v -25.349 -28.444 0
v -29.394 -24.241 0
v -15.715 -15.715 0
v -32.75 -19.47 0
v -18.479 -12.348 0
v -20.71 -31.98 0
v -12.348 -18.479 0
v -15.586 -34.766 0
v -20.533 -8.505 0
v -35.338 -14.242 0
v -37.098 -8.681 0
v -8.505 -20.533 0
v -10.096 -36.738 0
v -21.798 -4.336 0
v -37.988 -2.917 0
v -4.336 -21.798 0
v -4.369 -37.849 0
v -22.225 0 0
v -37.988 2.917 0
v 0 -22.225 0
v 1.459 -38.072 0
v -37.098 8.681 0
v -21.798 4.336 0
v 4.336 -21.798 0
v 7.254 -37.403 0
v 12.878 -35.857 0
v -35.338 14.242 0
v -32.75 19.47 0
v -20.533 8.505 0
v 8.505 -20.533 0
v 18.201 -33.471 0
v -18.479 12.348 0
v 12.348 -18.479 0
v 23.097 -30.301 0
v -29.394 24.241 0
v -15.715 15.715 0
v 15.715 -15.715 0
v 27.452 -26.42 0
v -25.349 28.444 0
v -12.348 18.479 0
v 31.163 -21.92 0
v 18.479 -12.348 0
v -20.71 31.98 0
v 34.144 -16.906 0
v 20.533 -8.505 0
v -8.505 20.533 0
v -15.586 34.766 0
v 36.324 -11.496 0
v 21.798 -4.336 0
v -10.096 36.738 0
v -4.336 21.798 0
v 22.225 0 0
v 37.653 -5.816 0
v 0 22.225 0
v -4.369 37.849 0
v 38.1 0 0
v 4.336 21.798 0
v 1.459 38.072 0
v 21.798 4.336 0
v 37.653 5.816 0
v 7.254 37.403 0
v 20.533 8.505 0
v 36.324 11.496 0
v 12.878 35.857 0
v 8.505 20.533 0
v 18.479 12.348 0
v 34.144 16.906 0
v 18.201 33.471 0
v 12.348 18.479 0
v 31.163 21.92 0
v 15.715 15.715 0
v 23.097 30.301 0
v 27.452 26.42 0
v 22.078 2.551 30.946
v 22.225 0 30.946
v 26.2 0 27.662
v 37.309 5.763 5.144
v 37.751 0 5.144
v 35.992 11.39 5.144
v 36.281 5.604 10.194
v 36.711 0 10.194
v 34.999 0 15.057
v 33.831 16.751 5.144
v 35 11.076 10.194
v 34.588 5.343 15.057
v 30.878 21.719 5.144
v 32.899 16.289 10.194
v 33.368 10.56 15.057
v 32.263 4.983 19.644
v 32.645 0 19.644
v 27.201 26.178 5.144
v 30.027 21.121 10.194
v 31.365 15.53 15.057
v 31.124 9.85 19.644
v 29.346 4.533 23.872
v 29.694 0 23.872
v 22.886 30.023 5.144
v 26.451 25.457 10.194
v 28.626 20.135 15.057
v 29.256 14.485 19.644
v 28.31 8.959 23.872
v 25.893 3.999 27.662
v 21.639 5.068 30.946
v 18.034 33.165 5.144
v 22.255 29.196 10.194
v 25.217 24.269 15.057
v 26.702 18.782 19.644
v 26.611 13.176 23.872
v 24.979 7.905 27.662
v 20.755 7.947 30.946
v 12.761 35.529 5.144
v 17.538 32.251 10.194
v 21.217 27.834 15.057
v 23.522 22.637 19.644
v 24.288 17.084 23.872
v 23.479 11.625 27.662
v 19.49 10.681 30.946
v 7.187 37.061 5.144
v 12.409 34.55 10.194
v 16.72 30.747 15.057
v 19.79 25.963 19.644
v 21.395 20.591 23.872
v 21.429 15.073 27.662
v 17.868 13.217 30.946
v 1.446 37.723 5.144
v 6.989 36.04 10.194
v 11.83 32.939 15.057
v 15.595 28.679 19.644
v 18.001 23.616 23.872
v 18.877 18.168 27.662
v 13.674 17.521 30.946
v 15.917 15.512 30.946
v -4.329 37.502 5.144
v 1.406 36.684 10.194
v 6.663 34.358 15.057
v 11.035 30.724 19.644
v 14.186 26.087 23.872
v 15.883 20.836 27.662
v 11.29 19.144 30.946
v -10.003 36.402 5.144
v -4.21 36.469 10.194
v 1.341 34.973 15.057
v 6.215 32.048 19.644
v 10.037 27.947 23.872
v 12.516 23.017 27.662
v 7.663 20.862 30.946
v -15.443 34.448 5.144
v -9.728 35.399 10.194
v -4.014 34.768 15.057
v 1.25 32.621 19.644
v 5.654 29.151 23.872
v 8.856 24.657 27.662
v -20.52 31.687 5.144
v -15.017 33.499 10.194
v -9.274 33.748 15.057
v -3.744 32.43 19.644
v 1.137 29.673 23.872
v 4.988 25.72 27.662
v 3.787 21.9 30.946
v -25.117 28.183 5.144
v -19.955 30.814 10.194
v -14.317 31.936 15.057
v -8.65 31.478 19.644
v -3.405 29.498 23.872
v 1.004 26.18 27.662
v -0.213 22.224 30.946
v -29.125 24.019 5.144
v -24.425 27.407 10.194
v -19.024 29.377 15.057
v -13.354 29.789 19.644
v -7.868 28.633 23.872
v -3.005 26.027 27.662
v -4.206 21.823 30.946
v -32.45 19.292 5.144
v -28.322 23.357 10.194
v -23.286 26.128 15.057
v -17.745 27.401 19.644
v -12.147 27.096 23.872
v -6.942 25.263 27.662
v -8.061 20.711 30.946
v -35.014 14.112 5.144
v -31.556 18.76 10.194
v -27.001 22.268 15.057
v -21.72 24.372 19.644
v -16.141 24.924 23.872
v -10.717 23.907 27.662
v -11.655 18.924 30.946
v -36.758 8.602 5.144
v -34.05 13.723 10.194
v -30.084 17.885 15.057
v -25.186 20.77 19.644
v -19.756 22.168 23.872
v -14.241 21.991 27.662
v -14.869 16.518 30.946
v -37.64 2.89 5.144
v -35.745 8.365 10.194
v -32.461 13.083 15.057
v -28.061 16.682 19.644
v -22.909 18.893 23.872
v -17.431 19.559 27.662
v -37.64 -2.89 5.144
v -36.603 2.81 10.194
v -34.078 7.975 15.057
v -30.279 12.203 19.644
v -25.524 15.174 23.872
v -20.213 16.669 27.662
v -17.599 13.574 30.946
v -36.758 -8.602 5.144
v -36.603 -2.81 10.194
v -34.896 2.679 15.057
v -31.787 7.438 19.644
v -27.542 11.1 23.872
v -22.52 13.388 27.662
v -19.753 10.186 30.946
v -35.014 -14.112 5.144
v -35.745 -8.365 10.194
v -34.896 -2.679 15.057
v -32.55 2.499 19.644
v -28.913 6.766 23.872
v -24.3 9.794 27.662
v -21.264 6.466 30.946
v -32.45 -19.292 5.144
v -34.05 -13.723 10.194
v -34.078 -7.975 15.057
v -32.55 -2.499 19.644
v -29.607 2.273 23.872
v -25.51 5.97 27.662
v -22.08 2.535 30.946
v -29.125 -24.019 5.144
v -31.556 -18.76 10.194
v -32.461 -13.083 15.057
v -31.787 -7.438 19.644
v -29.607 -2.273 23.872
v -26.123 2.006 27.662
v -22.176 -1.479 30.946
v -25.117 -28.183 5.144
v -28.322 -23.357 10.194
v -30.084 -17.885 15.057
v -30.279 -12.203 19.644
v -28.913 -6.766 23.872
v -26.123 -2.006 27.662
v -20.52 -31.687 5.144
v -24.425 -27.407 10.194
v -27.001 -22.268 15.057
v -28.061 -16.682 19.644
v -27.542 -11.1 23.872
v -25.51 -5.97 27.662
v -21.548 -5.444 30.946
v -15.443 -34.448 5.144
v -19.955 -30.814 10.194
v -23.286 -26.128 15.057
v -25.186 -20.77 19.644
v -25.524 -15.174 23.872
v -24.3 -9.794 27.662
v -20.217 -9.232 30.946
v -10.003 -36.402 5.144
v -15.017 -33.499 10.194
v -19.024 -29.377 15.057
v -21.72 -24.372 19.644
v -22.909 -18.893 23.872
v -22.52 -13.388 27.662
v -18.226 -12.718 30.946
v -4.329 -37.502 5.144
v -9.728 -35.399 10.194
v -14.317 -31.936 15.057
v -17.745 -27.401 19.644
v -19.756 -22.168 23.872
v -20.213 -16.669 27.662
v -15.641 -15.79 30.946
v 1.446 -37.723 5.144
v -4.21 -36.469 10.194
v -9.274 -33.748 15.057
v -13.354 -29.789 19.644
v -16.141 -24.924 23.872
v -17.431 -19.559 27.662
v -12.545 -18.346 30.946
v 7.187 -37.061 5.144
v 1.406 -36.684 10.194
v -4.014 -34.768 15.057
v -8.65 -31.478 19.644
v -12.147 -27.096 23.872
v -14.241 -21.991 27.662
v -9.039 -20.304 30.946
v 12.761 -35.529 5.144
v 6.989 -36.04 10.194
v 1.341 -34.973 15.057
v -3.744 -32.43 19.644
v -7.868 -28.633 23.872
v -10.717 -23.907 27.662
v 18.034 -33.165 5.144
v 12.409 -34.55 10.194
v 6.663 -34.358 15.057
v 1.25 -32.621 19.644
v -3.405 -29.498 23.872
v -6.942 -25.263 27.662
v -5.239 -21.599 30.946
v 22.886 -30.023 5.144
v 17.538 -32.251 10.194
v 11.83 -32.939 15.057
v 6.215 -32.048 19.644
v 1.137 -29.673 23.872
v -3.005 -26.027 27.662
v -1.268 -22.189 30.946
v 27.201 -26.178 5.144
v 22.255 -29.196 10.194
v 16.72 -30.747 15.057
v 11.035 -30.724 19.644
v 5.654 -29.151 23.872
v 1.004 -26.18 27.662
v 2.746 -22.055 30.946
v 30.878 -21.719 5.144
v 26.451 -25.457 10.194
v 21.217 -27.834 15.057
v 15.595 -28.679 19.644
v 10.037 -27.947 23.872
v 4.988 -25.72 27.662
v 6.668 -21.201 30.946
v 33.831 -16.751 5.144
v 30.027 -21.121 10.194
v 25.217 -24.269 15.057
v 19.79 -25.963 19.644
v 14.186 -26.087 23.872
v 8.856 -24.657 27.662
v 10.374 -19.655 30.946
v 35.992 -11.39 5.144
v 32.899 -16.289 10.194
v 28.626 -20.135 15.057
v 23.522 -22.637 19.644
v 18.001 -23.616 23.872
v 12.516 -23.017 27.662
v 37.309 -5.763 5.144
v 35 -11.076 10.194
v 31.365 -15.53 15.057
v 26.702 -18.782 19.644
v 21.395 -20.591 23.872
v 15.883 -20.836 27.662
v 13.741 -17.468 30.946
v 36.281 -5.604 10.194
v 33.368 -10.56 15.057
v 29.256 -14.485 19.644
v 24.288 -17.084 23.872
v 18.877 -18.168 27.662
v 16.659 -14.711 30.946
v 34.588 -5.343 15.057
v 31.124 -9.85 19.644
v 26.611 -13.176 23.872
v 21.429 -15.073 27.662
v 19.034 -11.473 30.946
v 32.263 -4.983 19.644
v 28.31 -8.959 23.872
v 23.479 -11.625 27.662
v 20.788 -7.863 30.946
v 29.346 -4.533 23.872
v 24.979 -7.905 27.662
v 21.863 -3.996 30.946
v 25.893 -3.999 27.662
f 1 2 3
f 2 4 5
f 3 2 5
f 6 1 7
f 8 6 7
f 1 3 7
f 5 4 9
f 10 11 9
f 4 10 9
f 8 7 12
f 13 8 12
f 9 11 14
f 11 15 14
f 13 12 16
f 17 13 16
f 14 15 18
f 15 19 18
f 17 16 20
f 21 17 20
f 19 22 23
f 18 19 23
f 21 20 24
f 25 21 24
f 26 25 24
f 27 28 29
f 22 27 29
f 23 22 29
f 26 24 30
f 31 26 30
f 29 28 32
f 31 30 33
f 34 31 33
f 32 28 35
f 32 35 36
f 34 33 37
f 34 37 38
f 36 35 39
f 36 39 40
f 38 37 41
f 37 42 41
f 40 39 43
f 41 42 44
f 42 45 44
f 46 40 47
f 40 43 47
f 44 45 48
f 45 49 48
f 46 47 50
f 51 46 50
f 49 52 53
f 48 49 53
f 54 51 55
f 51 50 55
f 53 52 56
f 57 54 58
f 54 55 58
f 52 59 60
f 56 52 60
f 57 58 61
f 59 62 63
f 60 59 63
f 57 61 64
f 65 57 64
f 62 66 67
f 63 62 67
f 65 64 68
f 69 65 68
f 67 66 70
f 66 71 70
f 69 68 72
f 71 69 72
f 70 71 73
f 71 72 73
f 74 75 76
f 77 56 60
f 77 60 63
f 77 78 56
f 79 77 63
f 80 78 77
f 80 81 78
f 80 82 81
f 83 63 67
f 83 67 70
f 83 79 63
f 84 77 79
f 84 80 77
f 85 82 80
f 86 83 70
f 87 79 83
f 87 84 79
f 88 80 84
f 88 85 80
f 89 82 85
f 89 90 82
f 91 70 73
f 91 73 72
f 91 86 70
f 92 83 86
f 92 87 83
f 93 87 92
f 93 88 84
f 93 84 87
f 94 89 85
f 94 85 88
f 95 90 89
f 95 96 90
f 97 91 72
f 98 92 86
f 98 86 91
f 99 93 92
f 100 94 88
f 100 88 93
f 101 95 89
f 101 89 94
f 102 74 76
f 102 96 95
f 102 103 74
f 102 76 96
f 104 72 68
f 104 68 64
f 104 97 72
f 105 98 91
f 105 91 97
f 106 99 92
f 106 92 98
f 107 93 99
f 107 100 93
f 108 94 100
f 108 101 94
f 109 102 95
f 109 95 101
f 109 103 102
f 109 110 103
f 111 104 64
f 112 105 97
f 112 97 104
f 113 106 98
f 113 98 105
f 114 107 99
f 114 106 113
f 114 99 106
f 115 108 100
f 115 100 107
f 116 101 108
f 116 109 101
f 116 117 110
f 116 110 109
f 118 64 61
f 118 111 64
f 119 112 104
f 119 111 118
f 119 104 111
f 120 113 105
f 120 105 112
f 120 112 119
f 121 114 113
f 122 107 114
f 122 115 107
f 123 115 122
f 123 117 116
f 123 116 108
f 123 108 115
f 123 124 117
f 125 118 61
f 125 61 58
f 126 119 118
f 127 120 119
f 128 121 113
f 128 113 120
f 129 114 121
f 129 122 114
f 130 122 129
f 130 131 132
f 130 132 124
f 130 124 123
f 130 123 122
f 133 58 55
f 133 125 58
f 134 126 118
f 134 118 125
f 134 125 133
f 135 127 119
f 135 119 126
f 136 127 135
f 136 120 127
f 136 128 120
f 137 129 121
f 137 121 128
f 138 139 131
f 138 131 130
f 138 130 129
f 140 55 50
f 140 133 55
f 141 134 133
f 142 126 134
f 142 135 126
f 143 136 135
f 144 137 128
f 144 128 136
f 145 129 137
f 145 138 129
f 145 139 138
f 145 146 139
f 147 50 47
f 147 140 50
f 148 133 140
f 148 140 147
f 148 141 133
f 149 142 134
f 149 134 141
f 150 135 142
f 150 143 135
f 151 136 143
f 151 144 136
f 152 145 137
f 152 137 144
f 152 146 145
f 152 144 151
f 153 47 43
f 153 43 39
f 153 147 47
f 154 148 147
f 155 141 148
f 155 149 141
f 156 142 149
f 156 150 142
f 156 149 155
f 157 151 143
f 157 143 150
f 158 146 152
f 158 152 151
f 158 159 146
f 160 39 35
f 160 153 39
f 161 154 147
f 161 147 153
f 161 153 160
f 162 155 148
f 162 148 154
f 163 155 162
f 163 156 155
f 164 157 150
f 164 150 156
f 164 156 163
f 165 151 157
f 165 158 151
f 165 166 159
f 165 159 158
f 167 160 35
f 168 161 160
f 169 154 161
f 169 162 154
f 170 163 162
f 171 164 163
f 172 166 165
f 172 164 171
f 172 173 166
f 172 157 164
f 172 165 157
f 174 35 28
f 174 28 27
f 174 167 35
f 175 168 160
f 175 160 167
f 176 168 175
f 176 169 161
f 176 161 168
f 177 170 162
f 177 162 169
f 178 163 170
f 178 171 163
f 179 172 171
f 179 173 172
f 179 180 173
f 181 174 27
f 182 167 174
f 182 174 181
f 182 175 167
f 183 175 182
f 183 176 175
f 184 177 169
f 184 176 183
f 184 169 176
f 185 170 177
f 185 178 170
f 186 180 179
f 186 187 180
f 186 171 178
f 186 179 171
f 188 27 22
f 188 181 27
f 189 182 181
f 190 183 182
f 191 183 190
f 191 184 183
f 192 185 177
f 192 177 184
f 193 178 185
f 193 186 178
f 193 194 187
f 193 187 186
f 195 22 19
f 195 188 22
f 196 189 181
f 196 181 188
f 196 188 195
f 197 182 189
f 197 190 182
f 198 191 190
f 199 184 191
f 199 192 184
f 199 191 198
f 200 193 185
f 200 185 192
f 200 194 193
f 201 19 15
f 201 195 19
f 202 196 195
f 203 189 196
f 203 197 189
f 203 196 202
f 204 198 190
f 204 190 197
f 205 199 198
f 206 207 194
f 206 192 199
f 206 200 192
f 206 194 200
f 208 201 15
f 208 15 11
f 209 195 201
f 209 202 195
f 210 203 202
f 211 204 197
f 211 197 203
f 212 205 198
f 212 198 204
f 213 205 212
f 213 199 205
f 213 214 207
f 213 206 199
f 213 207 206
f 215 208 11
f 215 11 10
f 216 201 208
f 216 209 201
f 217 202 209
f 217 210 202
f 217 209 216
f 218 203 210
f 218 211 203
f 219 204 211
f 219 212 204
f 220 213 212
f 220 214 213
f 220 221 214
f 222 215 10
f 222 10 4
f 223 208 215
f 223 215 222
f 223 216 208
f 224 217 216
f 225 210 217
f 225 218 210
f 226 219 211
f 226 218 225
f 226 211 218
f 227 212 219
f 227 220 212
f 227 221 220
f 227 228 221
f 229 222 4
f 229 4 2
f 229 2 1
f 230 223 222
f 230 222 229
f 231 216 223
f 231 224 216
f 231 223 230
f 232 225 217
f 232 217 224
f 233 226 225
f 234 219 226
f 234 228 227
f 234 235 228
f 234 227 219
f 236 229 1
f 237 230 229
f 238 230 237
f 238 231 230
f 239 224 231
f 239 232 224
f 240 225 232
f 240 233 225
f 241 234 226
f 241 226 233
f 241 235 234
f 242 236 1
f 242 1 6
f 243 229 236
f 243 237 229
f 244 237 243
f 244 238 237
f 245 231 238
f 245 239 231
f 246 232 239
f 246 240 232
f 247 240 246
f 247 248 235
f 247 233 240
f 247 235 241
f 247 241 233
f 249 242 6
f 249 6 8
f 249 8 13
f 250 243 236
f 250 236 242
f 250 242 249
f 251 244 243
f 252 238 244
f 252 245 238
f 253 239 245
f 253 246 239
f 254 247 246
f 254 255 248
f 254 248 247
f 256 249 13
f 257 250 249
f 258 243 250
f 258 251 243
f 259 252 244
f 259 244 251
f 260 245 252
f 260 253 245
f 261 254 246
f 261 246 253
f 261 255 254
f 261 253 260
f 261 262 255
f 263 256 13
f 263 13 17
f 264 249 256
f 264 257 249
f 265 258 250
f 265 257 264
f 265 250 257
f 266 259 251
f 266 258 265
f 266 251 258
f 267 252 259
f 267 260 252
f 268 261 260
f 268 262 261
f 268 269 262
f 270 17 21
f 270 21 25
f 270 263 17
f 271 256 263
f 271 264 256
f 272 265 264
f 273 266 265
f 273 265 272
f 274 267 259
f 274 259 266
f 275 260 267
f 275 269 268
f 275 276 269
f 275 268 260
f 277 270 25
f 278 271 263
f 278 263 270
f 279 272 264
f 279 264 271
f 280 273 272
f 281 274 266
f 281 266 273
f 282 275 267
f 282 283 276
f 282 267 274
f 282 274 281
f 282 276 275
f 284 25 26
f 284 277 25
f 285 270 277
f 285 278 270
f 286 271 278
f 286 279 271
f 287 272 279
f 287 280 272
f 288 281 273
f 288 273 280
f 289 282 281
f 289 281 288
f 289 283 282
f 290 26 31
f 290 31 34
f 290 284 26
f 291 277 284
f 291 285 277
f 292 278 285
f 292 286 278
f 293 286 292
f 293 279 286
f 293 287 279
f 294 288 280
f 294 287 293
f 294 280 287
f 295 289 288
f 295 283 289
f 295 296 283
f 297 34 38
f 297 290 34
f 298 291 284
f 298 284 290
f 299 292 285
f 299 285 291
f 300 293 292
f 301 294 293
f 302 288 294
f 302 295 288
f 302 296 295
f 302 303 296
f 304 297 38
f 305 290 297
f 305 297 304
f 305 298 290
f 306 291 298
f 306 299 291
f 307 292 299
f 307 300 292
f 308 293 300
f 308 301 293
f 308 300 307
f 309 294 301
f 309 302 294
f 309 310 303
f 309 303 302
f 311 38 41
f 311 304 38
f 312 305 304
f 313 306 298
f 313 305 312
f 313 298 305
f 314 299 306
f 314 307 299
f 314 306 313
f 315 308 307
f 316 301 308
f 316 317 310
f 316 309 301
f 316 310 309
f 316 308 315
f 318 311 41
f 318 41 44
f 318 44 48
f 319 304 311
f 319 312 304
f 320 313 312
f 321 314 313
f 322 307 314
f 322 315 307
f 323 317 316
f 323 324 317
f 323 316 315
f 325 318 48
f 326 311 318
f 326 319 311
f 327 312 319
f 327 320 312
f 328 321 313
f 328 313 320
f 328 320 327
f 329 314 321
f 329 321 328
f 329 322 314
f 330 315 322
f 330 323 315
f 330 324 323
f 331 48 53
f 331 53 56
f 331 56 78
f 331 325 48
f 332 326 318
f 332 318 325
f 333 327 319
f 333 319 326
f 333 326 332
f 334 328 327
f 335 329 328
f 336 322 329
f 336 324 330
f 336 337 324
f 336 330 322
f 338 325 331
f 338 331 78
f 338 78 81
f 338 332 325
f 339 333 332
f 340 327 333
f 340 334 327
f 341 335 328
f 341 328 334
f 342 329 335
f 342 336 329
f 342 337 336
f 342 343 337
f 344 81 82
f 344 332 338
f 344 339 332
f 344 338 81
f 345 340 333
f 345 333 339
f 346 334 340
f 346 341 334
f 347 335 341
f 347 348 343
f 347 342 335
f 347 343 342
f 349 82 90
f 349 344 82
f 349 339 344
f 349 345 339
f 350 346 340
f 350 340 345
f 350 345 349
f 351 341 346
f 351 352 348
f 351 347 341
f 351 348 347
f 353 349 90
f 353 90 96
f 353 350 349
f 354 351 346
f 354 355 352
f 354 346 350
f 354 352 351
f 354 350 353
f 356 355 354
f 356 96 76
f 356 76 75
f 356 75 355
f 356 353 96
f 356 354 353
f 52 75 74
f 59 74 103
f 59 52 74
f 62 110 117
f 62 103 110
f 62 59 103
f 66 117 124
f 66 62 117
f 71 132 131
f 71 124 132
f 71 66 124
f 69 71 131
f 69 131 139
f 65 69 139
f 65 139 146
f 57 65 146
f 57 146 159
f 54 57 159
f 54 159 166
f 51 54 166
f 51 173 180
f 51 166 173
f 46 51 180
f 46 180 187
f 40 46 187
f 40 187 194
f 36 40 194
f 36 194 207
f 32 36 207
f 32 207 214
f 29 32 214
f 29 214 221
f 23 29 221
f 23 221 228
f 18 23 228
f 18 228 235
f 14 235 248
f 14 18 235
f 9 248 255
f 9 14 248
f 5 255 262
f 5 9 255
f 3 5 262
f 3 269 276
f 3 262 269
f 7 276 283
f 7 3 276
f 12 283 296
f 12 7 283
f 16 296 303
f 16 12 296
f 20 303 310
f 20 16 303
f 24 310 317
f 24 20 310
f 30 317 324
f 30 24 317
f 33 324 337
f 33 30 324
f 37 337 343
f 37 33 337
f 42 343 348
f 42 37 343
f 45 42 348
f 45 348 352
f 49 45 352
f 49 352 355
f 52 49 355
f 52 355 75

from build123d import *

# Parameters (mm, degrees)
F0_R     = 38.1
F1_DEPTH = 38.1
F2_R     = 38.09999
F3_R     = 22.225
F4_DEPTH = 151.384


# Not quite as in the source:
# - a fillet or chamfer is up to 0.001 mm smaller than in the source, because OpenCascade refuses the exact size


with BuildPart() as f1:
    # F0 (on Top) → F1 (new body)
    with BuildSketch(Plane.XY):
        Circle(F0_R)
    extrude(amount=F1_DEPTH)

    # F2 (radius 38.1 in the source; OpenCascade refuses exactly that, so slightly less here)
    f2_edges = [f1.edges().sort_by_distance(p)[0] for p in [
        (-38.1, 0, 38.1),
    ]]
    fillet(f2_edges, radius=F2_R)

    # F3 (on Top) → F4 (cut)
    with BuildSketch(Plane.XY):
        Circle(F3_R)
    extrude(amount=F4_DEPTH, mode=Mode.SUBTRACT)


solid = f1.part
